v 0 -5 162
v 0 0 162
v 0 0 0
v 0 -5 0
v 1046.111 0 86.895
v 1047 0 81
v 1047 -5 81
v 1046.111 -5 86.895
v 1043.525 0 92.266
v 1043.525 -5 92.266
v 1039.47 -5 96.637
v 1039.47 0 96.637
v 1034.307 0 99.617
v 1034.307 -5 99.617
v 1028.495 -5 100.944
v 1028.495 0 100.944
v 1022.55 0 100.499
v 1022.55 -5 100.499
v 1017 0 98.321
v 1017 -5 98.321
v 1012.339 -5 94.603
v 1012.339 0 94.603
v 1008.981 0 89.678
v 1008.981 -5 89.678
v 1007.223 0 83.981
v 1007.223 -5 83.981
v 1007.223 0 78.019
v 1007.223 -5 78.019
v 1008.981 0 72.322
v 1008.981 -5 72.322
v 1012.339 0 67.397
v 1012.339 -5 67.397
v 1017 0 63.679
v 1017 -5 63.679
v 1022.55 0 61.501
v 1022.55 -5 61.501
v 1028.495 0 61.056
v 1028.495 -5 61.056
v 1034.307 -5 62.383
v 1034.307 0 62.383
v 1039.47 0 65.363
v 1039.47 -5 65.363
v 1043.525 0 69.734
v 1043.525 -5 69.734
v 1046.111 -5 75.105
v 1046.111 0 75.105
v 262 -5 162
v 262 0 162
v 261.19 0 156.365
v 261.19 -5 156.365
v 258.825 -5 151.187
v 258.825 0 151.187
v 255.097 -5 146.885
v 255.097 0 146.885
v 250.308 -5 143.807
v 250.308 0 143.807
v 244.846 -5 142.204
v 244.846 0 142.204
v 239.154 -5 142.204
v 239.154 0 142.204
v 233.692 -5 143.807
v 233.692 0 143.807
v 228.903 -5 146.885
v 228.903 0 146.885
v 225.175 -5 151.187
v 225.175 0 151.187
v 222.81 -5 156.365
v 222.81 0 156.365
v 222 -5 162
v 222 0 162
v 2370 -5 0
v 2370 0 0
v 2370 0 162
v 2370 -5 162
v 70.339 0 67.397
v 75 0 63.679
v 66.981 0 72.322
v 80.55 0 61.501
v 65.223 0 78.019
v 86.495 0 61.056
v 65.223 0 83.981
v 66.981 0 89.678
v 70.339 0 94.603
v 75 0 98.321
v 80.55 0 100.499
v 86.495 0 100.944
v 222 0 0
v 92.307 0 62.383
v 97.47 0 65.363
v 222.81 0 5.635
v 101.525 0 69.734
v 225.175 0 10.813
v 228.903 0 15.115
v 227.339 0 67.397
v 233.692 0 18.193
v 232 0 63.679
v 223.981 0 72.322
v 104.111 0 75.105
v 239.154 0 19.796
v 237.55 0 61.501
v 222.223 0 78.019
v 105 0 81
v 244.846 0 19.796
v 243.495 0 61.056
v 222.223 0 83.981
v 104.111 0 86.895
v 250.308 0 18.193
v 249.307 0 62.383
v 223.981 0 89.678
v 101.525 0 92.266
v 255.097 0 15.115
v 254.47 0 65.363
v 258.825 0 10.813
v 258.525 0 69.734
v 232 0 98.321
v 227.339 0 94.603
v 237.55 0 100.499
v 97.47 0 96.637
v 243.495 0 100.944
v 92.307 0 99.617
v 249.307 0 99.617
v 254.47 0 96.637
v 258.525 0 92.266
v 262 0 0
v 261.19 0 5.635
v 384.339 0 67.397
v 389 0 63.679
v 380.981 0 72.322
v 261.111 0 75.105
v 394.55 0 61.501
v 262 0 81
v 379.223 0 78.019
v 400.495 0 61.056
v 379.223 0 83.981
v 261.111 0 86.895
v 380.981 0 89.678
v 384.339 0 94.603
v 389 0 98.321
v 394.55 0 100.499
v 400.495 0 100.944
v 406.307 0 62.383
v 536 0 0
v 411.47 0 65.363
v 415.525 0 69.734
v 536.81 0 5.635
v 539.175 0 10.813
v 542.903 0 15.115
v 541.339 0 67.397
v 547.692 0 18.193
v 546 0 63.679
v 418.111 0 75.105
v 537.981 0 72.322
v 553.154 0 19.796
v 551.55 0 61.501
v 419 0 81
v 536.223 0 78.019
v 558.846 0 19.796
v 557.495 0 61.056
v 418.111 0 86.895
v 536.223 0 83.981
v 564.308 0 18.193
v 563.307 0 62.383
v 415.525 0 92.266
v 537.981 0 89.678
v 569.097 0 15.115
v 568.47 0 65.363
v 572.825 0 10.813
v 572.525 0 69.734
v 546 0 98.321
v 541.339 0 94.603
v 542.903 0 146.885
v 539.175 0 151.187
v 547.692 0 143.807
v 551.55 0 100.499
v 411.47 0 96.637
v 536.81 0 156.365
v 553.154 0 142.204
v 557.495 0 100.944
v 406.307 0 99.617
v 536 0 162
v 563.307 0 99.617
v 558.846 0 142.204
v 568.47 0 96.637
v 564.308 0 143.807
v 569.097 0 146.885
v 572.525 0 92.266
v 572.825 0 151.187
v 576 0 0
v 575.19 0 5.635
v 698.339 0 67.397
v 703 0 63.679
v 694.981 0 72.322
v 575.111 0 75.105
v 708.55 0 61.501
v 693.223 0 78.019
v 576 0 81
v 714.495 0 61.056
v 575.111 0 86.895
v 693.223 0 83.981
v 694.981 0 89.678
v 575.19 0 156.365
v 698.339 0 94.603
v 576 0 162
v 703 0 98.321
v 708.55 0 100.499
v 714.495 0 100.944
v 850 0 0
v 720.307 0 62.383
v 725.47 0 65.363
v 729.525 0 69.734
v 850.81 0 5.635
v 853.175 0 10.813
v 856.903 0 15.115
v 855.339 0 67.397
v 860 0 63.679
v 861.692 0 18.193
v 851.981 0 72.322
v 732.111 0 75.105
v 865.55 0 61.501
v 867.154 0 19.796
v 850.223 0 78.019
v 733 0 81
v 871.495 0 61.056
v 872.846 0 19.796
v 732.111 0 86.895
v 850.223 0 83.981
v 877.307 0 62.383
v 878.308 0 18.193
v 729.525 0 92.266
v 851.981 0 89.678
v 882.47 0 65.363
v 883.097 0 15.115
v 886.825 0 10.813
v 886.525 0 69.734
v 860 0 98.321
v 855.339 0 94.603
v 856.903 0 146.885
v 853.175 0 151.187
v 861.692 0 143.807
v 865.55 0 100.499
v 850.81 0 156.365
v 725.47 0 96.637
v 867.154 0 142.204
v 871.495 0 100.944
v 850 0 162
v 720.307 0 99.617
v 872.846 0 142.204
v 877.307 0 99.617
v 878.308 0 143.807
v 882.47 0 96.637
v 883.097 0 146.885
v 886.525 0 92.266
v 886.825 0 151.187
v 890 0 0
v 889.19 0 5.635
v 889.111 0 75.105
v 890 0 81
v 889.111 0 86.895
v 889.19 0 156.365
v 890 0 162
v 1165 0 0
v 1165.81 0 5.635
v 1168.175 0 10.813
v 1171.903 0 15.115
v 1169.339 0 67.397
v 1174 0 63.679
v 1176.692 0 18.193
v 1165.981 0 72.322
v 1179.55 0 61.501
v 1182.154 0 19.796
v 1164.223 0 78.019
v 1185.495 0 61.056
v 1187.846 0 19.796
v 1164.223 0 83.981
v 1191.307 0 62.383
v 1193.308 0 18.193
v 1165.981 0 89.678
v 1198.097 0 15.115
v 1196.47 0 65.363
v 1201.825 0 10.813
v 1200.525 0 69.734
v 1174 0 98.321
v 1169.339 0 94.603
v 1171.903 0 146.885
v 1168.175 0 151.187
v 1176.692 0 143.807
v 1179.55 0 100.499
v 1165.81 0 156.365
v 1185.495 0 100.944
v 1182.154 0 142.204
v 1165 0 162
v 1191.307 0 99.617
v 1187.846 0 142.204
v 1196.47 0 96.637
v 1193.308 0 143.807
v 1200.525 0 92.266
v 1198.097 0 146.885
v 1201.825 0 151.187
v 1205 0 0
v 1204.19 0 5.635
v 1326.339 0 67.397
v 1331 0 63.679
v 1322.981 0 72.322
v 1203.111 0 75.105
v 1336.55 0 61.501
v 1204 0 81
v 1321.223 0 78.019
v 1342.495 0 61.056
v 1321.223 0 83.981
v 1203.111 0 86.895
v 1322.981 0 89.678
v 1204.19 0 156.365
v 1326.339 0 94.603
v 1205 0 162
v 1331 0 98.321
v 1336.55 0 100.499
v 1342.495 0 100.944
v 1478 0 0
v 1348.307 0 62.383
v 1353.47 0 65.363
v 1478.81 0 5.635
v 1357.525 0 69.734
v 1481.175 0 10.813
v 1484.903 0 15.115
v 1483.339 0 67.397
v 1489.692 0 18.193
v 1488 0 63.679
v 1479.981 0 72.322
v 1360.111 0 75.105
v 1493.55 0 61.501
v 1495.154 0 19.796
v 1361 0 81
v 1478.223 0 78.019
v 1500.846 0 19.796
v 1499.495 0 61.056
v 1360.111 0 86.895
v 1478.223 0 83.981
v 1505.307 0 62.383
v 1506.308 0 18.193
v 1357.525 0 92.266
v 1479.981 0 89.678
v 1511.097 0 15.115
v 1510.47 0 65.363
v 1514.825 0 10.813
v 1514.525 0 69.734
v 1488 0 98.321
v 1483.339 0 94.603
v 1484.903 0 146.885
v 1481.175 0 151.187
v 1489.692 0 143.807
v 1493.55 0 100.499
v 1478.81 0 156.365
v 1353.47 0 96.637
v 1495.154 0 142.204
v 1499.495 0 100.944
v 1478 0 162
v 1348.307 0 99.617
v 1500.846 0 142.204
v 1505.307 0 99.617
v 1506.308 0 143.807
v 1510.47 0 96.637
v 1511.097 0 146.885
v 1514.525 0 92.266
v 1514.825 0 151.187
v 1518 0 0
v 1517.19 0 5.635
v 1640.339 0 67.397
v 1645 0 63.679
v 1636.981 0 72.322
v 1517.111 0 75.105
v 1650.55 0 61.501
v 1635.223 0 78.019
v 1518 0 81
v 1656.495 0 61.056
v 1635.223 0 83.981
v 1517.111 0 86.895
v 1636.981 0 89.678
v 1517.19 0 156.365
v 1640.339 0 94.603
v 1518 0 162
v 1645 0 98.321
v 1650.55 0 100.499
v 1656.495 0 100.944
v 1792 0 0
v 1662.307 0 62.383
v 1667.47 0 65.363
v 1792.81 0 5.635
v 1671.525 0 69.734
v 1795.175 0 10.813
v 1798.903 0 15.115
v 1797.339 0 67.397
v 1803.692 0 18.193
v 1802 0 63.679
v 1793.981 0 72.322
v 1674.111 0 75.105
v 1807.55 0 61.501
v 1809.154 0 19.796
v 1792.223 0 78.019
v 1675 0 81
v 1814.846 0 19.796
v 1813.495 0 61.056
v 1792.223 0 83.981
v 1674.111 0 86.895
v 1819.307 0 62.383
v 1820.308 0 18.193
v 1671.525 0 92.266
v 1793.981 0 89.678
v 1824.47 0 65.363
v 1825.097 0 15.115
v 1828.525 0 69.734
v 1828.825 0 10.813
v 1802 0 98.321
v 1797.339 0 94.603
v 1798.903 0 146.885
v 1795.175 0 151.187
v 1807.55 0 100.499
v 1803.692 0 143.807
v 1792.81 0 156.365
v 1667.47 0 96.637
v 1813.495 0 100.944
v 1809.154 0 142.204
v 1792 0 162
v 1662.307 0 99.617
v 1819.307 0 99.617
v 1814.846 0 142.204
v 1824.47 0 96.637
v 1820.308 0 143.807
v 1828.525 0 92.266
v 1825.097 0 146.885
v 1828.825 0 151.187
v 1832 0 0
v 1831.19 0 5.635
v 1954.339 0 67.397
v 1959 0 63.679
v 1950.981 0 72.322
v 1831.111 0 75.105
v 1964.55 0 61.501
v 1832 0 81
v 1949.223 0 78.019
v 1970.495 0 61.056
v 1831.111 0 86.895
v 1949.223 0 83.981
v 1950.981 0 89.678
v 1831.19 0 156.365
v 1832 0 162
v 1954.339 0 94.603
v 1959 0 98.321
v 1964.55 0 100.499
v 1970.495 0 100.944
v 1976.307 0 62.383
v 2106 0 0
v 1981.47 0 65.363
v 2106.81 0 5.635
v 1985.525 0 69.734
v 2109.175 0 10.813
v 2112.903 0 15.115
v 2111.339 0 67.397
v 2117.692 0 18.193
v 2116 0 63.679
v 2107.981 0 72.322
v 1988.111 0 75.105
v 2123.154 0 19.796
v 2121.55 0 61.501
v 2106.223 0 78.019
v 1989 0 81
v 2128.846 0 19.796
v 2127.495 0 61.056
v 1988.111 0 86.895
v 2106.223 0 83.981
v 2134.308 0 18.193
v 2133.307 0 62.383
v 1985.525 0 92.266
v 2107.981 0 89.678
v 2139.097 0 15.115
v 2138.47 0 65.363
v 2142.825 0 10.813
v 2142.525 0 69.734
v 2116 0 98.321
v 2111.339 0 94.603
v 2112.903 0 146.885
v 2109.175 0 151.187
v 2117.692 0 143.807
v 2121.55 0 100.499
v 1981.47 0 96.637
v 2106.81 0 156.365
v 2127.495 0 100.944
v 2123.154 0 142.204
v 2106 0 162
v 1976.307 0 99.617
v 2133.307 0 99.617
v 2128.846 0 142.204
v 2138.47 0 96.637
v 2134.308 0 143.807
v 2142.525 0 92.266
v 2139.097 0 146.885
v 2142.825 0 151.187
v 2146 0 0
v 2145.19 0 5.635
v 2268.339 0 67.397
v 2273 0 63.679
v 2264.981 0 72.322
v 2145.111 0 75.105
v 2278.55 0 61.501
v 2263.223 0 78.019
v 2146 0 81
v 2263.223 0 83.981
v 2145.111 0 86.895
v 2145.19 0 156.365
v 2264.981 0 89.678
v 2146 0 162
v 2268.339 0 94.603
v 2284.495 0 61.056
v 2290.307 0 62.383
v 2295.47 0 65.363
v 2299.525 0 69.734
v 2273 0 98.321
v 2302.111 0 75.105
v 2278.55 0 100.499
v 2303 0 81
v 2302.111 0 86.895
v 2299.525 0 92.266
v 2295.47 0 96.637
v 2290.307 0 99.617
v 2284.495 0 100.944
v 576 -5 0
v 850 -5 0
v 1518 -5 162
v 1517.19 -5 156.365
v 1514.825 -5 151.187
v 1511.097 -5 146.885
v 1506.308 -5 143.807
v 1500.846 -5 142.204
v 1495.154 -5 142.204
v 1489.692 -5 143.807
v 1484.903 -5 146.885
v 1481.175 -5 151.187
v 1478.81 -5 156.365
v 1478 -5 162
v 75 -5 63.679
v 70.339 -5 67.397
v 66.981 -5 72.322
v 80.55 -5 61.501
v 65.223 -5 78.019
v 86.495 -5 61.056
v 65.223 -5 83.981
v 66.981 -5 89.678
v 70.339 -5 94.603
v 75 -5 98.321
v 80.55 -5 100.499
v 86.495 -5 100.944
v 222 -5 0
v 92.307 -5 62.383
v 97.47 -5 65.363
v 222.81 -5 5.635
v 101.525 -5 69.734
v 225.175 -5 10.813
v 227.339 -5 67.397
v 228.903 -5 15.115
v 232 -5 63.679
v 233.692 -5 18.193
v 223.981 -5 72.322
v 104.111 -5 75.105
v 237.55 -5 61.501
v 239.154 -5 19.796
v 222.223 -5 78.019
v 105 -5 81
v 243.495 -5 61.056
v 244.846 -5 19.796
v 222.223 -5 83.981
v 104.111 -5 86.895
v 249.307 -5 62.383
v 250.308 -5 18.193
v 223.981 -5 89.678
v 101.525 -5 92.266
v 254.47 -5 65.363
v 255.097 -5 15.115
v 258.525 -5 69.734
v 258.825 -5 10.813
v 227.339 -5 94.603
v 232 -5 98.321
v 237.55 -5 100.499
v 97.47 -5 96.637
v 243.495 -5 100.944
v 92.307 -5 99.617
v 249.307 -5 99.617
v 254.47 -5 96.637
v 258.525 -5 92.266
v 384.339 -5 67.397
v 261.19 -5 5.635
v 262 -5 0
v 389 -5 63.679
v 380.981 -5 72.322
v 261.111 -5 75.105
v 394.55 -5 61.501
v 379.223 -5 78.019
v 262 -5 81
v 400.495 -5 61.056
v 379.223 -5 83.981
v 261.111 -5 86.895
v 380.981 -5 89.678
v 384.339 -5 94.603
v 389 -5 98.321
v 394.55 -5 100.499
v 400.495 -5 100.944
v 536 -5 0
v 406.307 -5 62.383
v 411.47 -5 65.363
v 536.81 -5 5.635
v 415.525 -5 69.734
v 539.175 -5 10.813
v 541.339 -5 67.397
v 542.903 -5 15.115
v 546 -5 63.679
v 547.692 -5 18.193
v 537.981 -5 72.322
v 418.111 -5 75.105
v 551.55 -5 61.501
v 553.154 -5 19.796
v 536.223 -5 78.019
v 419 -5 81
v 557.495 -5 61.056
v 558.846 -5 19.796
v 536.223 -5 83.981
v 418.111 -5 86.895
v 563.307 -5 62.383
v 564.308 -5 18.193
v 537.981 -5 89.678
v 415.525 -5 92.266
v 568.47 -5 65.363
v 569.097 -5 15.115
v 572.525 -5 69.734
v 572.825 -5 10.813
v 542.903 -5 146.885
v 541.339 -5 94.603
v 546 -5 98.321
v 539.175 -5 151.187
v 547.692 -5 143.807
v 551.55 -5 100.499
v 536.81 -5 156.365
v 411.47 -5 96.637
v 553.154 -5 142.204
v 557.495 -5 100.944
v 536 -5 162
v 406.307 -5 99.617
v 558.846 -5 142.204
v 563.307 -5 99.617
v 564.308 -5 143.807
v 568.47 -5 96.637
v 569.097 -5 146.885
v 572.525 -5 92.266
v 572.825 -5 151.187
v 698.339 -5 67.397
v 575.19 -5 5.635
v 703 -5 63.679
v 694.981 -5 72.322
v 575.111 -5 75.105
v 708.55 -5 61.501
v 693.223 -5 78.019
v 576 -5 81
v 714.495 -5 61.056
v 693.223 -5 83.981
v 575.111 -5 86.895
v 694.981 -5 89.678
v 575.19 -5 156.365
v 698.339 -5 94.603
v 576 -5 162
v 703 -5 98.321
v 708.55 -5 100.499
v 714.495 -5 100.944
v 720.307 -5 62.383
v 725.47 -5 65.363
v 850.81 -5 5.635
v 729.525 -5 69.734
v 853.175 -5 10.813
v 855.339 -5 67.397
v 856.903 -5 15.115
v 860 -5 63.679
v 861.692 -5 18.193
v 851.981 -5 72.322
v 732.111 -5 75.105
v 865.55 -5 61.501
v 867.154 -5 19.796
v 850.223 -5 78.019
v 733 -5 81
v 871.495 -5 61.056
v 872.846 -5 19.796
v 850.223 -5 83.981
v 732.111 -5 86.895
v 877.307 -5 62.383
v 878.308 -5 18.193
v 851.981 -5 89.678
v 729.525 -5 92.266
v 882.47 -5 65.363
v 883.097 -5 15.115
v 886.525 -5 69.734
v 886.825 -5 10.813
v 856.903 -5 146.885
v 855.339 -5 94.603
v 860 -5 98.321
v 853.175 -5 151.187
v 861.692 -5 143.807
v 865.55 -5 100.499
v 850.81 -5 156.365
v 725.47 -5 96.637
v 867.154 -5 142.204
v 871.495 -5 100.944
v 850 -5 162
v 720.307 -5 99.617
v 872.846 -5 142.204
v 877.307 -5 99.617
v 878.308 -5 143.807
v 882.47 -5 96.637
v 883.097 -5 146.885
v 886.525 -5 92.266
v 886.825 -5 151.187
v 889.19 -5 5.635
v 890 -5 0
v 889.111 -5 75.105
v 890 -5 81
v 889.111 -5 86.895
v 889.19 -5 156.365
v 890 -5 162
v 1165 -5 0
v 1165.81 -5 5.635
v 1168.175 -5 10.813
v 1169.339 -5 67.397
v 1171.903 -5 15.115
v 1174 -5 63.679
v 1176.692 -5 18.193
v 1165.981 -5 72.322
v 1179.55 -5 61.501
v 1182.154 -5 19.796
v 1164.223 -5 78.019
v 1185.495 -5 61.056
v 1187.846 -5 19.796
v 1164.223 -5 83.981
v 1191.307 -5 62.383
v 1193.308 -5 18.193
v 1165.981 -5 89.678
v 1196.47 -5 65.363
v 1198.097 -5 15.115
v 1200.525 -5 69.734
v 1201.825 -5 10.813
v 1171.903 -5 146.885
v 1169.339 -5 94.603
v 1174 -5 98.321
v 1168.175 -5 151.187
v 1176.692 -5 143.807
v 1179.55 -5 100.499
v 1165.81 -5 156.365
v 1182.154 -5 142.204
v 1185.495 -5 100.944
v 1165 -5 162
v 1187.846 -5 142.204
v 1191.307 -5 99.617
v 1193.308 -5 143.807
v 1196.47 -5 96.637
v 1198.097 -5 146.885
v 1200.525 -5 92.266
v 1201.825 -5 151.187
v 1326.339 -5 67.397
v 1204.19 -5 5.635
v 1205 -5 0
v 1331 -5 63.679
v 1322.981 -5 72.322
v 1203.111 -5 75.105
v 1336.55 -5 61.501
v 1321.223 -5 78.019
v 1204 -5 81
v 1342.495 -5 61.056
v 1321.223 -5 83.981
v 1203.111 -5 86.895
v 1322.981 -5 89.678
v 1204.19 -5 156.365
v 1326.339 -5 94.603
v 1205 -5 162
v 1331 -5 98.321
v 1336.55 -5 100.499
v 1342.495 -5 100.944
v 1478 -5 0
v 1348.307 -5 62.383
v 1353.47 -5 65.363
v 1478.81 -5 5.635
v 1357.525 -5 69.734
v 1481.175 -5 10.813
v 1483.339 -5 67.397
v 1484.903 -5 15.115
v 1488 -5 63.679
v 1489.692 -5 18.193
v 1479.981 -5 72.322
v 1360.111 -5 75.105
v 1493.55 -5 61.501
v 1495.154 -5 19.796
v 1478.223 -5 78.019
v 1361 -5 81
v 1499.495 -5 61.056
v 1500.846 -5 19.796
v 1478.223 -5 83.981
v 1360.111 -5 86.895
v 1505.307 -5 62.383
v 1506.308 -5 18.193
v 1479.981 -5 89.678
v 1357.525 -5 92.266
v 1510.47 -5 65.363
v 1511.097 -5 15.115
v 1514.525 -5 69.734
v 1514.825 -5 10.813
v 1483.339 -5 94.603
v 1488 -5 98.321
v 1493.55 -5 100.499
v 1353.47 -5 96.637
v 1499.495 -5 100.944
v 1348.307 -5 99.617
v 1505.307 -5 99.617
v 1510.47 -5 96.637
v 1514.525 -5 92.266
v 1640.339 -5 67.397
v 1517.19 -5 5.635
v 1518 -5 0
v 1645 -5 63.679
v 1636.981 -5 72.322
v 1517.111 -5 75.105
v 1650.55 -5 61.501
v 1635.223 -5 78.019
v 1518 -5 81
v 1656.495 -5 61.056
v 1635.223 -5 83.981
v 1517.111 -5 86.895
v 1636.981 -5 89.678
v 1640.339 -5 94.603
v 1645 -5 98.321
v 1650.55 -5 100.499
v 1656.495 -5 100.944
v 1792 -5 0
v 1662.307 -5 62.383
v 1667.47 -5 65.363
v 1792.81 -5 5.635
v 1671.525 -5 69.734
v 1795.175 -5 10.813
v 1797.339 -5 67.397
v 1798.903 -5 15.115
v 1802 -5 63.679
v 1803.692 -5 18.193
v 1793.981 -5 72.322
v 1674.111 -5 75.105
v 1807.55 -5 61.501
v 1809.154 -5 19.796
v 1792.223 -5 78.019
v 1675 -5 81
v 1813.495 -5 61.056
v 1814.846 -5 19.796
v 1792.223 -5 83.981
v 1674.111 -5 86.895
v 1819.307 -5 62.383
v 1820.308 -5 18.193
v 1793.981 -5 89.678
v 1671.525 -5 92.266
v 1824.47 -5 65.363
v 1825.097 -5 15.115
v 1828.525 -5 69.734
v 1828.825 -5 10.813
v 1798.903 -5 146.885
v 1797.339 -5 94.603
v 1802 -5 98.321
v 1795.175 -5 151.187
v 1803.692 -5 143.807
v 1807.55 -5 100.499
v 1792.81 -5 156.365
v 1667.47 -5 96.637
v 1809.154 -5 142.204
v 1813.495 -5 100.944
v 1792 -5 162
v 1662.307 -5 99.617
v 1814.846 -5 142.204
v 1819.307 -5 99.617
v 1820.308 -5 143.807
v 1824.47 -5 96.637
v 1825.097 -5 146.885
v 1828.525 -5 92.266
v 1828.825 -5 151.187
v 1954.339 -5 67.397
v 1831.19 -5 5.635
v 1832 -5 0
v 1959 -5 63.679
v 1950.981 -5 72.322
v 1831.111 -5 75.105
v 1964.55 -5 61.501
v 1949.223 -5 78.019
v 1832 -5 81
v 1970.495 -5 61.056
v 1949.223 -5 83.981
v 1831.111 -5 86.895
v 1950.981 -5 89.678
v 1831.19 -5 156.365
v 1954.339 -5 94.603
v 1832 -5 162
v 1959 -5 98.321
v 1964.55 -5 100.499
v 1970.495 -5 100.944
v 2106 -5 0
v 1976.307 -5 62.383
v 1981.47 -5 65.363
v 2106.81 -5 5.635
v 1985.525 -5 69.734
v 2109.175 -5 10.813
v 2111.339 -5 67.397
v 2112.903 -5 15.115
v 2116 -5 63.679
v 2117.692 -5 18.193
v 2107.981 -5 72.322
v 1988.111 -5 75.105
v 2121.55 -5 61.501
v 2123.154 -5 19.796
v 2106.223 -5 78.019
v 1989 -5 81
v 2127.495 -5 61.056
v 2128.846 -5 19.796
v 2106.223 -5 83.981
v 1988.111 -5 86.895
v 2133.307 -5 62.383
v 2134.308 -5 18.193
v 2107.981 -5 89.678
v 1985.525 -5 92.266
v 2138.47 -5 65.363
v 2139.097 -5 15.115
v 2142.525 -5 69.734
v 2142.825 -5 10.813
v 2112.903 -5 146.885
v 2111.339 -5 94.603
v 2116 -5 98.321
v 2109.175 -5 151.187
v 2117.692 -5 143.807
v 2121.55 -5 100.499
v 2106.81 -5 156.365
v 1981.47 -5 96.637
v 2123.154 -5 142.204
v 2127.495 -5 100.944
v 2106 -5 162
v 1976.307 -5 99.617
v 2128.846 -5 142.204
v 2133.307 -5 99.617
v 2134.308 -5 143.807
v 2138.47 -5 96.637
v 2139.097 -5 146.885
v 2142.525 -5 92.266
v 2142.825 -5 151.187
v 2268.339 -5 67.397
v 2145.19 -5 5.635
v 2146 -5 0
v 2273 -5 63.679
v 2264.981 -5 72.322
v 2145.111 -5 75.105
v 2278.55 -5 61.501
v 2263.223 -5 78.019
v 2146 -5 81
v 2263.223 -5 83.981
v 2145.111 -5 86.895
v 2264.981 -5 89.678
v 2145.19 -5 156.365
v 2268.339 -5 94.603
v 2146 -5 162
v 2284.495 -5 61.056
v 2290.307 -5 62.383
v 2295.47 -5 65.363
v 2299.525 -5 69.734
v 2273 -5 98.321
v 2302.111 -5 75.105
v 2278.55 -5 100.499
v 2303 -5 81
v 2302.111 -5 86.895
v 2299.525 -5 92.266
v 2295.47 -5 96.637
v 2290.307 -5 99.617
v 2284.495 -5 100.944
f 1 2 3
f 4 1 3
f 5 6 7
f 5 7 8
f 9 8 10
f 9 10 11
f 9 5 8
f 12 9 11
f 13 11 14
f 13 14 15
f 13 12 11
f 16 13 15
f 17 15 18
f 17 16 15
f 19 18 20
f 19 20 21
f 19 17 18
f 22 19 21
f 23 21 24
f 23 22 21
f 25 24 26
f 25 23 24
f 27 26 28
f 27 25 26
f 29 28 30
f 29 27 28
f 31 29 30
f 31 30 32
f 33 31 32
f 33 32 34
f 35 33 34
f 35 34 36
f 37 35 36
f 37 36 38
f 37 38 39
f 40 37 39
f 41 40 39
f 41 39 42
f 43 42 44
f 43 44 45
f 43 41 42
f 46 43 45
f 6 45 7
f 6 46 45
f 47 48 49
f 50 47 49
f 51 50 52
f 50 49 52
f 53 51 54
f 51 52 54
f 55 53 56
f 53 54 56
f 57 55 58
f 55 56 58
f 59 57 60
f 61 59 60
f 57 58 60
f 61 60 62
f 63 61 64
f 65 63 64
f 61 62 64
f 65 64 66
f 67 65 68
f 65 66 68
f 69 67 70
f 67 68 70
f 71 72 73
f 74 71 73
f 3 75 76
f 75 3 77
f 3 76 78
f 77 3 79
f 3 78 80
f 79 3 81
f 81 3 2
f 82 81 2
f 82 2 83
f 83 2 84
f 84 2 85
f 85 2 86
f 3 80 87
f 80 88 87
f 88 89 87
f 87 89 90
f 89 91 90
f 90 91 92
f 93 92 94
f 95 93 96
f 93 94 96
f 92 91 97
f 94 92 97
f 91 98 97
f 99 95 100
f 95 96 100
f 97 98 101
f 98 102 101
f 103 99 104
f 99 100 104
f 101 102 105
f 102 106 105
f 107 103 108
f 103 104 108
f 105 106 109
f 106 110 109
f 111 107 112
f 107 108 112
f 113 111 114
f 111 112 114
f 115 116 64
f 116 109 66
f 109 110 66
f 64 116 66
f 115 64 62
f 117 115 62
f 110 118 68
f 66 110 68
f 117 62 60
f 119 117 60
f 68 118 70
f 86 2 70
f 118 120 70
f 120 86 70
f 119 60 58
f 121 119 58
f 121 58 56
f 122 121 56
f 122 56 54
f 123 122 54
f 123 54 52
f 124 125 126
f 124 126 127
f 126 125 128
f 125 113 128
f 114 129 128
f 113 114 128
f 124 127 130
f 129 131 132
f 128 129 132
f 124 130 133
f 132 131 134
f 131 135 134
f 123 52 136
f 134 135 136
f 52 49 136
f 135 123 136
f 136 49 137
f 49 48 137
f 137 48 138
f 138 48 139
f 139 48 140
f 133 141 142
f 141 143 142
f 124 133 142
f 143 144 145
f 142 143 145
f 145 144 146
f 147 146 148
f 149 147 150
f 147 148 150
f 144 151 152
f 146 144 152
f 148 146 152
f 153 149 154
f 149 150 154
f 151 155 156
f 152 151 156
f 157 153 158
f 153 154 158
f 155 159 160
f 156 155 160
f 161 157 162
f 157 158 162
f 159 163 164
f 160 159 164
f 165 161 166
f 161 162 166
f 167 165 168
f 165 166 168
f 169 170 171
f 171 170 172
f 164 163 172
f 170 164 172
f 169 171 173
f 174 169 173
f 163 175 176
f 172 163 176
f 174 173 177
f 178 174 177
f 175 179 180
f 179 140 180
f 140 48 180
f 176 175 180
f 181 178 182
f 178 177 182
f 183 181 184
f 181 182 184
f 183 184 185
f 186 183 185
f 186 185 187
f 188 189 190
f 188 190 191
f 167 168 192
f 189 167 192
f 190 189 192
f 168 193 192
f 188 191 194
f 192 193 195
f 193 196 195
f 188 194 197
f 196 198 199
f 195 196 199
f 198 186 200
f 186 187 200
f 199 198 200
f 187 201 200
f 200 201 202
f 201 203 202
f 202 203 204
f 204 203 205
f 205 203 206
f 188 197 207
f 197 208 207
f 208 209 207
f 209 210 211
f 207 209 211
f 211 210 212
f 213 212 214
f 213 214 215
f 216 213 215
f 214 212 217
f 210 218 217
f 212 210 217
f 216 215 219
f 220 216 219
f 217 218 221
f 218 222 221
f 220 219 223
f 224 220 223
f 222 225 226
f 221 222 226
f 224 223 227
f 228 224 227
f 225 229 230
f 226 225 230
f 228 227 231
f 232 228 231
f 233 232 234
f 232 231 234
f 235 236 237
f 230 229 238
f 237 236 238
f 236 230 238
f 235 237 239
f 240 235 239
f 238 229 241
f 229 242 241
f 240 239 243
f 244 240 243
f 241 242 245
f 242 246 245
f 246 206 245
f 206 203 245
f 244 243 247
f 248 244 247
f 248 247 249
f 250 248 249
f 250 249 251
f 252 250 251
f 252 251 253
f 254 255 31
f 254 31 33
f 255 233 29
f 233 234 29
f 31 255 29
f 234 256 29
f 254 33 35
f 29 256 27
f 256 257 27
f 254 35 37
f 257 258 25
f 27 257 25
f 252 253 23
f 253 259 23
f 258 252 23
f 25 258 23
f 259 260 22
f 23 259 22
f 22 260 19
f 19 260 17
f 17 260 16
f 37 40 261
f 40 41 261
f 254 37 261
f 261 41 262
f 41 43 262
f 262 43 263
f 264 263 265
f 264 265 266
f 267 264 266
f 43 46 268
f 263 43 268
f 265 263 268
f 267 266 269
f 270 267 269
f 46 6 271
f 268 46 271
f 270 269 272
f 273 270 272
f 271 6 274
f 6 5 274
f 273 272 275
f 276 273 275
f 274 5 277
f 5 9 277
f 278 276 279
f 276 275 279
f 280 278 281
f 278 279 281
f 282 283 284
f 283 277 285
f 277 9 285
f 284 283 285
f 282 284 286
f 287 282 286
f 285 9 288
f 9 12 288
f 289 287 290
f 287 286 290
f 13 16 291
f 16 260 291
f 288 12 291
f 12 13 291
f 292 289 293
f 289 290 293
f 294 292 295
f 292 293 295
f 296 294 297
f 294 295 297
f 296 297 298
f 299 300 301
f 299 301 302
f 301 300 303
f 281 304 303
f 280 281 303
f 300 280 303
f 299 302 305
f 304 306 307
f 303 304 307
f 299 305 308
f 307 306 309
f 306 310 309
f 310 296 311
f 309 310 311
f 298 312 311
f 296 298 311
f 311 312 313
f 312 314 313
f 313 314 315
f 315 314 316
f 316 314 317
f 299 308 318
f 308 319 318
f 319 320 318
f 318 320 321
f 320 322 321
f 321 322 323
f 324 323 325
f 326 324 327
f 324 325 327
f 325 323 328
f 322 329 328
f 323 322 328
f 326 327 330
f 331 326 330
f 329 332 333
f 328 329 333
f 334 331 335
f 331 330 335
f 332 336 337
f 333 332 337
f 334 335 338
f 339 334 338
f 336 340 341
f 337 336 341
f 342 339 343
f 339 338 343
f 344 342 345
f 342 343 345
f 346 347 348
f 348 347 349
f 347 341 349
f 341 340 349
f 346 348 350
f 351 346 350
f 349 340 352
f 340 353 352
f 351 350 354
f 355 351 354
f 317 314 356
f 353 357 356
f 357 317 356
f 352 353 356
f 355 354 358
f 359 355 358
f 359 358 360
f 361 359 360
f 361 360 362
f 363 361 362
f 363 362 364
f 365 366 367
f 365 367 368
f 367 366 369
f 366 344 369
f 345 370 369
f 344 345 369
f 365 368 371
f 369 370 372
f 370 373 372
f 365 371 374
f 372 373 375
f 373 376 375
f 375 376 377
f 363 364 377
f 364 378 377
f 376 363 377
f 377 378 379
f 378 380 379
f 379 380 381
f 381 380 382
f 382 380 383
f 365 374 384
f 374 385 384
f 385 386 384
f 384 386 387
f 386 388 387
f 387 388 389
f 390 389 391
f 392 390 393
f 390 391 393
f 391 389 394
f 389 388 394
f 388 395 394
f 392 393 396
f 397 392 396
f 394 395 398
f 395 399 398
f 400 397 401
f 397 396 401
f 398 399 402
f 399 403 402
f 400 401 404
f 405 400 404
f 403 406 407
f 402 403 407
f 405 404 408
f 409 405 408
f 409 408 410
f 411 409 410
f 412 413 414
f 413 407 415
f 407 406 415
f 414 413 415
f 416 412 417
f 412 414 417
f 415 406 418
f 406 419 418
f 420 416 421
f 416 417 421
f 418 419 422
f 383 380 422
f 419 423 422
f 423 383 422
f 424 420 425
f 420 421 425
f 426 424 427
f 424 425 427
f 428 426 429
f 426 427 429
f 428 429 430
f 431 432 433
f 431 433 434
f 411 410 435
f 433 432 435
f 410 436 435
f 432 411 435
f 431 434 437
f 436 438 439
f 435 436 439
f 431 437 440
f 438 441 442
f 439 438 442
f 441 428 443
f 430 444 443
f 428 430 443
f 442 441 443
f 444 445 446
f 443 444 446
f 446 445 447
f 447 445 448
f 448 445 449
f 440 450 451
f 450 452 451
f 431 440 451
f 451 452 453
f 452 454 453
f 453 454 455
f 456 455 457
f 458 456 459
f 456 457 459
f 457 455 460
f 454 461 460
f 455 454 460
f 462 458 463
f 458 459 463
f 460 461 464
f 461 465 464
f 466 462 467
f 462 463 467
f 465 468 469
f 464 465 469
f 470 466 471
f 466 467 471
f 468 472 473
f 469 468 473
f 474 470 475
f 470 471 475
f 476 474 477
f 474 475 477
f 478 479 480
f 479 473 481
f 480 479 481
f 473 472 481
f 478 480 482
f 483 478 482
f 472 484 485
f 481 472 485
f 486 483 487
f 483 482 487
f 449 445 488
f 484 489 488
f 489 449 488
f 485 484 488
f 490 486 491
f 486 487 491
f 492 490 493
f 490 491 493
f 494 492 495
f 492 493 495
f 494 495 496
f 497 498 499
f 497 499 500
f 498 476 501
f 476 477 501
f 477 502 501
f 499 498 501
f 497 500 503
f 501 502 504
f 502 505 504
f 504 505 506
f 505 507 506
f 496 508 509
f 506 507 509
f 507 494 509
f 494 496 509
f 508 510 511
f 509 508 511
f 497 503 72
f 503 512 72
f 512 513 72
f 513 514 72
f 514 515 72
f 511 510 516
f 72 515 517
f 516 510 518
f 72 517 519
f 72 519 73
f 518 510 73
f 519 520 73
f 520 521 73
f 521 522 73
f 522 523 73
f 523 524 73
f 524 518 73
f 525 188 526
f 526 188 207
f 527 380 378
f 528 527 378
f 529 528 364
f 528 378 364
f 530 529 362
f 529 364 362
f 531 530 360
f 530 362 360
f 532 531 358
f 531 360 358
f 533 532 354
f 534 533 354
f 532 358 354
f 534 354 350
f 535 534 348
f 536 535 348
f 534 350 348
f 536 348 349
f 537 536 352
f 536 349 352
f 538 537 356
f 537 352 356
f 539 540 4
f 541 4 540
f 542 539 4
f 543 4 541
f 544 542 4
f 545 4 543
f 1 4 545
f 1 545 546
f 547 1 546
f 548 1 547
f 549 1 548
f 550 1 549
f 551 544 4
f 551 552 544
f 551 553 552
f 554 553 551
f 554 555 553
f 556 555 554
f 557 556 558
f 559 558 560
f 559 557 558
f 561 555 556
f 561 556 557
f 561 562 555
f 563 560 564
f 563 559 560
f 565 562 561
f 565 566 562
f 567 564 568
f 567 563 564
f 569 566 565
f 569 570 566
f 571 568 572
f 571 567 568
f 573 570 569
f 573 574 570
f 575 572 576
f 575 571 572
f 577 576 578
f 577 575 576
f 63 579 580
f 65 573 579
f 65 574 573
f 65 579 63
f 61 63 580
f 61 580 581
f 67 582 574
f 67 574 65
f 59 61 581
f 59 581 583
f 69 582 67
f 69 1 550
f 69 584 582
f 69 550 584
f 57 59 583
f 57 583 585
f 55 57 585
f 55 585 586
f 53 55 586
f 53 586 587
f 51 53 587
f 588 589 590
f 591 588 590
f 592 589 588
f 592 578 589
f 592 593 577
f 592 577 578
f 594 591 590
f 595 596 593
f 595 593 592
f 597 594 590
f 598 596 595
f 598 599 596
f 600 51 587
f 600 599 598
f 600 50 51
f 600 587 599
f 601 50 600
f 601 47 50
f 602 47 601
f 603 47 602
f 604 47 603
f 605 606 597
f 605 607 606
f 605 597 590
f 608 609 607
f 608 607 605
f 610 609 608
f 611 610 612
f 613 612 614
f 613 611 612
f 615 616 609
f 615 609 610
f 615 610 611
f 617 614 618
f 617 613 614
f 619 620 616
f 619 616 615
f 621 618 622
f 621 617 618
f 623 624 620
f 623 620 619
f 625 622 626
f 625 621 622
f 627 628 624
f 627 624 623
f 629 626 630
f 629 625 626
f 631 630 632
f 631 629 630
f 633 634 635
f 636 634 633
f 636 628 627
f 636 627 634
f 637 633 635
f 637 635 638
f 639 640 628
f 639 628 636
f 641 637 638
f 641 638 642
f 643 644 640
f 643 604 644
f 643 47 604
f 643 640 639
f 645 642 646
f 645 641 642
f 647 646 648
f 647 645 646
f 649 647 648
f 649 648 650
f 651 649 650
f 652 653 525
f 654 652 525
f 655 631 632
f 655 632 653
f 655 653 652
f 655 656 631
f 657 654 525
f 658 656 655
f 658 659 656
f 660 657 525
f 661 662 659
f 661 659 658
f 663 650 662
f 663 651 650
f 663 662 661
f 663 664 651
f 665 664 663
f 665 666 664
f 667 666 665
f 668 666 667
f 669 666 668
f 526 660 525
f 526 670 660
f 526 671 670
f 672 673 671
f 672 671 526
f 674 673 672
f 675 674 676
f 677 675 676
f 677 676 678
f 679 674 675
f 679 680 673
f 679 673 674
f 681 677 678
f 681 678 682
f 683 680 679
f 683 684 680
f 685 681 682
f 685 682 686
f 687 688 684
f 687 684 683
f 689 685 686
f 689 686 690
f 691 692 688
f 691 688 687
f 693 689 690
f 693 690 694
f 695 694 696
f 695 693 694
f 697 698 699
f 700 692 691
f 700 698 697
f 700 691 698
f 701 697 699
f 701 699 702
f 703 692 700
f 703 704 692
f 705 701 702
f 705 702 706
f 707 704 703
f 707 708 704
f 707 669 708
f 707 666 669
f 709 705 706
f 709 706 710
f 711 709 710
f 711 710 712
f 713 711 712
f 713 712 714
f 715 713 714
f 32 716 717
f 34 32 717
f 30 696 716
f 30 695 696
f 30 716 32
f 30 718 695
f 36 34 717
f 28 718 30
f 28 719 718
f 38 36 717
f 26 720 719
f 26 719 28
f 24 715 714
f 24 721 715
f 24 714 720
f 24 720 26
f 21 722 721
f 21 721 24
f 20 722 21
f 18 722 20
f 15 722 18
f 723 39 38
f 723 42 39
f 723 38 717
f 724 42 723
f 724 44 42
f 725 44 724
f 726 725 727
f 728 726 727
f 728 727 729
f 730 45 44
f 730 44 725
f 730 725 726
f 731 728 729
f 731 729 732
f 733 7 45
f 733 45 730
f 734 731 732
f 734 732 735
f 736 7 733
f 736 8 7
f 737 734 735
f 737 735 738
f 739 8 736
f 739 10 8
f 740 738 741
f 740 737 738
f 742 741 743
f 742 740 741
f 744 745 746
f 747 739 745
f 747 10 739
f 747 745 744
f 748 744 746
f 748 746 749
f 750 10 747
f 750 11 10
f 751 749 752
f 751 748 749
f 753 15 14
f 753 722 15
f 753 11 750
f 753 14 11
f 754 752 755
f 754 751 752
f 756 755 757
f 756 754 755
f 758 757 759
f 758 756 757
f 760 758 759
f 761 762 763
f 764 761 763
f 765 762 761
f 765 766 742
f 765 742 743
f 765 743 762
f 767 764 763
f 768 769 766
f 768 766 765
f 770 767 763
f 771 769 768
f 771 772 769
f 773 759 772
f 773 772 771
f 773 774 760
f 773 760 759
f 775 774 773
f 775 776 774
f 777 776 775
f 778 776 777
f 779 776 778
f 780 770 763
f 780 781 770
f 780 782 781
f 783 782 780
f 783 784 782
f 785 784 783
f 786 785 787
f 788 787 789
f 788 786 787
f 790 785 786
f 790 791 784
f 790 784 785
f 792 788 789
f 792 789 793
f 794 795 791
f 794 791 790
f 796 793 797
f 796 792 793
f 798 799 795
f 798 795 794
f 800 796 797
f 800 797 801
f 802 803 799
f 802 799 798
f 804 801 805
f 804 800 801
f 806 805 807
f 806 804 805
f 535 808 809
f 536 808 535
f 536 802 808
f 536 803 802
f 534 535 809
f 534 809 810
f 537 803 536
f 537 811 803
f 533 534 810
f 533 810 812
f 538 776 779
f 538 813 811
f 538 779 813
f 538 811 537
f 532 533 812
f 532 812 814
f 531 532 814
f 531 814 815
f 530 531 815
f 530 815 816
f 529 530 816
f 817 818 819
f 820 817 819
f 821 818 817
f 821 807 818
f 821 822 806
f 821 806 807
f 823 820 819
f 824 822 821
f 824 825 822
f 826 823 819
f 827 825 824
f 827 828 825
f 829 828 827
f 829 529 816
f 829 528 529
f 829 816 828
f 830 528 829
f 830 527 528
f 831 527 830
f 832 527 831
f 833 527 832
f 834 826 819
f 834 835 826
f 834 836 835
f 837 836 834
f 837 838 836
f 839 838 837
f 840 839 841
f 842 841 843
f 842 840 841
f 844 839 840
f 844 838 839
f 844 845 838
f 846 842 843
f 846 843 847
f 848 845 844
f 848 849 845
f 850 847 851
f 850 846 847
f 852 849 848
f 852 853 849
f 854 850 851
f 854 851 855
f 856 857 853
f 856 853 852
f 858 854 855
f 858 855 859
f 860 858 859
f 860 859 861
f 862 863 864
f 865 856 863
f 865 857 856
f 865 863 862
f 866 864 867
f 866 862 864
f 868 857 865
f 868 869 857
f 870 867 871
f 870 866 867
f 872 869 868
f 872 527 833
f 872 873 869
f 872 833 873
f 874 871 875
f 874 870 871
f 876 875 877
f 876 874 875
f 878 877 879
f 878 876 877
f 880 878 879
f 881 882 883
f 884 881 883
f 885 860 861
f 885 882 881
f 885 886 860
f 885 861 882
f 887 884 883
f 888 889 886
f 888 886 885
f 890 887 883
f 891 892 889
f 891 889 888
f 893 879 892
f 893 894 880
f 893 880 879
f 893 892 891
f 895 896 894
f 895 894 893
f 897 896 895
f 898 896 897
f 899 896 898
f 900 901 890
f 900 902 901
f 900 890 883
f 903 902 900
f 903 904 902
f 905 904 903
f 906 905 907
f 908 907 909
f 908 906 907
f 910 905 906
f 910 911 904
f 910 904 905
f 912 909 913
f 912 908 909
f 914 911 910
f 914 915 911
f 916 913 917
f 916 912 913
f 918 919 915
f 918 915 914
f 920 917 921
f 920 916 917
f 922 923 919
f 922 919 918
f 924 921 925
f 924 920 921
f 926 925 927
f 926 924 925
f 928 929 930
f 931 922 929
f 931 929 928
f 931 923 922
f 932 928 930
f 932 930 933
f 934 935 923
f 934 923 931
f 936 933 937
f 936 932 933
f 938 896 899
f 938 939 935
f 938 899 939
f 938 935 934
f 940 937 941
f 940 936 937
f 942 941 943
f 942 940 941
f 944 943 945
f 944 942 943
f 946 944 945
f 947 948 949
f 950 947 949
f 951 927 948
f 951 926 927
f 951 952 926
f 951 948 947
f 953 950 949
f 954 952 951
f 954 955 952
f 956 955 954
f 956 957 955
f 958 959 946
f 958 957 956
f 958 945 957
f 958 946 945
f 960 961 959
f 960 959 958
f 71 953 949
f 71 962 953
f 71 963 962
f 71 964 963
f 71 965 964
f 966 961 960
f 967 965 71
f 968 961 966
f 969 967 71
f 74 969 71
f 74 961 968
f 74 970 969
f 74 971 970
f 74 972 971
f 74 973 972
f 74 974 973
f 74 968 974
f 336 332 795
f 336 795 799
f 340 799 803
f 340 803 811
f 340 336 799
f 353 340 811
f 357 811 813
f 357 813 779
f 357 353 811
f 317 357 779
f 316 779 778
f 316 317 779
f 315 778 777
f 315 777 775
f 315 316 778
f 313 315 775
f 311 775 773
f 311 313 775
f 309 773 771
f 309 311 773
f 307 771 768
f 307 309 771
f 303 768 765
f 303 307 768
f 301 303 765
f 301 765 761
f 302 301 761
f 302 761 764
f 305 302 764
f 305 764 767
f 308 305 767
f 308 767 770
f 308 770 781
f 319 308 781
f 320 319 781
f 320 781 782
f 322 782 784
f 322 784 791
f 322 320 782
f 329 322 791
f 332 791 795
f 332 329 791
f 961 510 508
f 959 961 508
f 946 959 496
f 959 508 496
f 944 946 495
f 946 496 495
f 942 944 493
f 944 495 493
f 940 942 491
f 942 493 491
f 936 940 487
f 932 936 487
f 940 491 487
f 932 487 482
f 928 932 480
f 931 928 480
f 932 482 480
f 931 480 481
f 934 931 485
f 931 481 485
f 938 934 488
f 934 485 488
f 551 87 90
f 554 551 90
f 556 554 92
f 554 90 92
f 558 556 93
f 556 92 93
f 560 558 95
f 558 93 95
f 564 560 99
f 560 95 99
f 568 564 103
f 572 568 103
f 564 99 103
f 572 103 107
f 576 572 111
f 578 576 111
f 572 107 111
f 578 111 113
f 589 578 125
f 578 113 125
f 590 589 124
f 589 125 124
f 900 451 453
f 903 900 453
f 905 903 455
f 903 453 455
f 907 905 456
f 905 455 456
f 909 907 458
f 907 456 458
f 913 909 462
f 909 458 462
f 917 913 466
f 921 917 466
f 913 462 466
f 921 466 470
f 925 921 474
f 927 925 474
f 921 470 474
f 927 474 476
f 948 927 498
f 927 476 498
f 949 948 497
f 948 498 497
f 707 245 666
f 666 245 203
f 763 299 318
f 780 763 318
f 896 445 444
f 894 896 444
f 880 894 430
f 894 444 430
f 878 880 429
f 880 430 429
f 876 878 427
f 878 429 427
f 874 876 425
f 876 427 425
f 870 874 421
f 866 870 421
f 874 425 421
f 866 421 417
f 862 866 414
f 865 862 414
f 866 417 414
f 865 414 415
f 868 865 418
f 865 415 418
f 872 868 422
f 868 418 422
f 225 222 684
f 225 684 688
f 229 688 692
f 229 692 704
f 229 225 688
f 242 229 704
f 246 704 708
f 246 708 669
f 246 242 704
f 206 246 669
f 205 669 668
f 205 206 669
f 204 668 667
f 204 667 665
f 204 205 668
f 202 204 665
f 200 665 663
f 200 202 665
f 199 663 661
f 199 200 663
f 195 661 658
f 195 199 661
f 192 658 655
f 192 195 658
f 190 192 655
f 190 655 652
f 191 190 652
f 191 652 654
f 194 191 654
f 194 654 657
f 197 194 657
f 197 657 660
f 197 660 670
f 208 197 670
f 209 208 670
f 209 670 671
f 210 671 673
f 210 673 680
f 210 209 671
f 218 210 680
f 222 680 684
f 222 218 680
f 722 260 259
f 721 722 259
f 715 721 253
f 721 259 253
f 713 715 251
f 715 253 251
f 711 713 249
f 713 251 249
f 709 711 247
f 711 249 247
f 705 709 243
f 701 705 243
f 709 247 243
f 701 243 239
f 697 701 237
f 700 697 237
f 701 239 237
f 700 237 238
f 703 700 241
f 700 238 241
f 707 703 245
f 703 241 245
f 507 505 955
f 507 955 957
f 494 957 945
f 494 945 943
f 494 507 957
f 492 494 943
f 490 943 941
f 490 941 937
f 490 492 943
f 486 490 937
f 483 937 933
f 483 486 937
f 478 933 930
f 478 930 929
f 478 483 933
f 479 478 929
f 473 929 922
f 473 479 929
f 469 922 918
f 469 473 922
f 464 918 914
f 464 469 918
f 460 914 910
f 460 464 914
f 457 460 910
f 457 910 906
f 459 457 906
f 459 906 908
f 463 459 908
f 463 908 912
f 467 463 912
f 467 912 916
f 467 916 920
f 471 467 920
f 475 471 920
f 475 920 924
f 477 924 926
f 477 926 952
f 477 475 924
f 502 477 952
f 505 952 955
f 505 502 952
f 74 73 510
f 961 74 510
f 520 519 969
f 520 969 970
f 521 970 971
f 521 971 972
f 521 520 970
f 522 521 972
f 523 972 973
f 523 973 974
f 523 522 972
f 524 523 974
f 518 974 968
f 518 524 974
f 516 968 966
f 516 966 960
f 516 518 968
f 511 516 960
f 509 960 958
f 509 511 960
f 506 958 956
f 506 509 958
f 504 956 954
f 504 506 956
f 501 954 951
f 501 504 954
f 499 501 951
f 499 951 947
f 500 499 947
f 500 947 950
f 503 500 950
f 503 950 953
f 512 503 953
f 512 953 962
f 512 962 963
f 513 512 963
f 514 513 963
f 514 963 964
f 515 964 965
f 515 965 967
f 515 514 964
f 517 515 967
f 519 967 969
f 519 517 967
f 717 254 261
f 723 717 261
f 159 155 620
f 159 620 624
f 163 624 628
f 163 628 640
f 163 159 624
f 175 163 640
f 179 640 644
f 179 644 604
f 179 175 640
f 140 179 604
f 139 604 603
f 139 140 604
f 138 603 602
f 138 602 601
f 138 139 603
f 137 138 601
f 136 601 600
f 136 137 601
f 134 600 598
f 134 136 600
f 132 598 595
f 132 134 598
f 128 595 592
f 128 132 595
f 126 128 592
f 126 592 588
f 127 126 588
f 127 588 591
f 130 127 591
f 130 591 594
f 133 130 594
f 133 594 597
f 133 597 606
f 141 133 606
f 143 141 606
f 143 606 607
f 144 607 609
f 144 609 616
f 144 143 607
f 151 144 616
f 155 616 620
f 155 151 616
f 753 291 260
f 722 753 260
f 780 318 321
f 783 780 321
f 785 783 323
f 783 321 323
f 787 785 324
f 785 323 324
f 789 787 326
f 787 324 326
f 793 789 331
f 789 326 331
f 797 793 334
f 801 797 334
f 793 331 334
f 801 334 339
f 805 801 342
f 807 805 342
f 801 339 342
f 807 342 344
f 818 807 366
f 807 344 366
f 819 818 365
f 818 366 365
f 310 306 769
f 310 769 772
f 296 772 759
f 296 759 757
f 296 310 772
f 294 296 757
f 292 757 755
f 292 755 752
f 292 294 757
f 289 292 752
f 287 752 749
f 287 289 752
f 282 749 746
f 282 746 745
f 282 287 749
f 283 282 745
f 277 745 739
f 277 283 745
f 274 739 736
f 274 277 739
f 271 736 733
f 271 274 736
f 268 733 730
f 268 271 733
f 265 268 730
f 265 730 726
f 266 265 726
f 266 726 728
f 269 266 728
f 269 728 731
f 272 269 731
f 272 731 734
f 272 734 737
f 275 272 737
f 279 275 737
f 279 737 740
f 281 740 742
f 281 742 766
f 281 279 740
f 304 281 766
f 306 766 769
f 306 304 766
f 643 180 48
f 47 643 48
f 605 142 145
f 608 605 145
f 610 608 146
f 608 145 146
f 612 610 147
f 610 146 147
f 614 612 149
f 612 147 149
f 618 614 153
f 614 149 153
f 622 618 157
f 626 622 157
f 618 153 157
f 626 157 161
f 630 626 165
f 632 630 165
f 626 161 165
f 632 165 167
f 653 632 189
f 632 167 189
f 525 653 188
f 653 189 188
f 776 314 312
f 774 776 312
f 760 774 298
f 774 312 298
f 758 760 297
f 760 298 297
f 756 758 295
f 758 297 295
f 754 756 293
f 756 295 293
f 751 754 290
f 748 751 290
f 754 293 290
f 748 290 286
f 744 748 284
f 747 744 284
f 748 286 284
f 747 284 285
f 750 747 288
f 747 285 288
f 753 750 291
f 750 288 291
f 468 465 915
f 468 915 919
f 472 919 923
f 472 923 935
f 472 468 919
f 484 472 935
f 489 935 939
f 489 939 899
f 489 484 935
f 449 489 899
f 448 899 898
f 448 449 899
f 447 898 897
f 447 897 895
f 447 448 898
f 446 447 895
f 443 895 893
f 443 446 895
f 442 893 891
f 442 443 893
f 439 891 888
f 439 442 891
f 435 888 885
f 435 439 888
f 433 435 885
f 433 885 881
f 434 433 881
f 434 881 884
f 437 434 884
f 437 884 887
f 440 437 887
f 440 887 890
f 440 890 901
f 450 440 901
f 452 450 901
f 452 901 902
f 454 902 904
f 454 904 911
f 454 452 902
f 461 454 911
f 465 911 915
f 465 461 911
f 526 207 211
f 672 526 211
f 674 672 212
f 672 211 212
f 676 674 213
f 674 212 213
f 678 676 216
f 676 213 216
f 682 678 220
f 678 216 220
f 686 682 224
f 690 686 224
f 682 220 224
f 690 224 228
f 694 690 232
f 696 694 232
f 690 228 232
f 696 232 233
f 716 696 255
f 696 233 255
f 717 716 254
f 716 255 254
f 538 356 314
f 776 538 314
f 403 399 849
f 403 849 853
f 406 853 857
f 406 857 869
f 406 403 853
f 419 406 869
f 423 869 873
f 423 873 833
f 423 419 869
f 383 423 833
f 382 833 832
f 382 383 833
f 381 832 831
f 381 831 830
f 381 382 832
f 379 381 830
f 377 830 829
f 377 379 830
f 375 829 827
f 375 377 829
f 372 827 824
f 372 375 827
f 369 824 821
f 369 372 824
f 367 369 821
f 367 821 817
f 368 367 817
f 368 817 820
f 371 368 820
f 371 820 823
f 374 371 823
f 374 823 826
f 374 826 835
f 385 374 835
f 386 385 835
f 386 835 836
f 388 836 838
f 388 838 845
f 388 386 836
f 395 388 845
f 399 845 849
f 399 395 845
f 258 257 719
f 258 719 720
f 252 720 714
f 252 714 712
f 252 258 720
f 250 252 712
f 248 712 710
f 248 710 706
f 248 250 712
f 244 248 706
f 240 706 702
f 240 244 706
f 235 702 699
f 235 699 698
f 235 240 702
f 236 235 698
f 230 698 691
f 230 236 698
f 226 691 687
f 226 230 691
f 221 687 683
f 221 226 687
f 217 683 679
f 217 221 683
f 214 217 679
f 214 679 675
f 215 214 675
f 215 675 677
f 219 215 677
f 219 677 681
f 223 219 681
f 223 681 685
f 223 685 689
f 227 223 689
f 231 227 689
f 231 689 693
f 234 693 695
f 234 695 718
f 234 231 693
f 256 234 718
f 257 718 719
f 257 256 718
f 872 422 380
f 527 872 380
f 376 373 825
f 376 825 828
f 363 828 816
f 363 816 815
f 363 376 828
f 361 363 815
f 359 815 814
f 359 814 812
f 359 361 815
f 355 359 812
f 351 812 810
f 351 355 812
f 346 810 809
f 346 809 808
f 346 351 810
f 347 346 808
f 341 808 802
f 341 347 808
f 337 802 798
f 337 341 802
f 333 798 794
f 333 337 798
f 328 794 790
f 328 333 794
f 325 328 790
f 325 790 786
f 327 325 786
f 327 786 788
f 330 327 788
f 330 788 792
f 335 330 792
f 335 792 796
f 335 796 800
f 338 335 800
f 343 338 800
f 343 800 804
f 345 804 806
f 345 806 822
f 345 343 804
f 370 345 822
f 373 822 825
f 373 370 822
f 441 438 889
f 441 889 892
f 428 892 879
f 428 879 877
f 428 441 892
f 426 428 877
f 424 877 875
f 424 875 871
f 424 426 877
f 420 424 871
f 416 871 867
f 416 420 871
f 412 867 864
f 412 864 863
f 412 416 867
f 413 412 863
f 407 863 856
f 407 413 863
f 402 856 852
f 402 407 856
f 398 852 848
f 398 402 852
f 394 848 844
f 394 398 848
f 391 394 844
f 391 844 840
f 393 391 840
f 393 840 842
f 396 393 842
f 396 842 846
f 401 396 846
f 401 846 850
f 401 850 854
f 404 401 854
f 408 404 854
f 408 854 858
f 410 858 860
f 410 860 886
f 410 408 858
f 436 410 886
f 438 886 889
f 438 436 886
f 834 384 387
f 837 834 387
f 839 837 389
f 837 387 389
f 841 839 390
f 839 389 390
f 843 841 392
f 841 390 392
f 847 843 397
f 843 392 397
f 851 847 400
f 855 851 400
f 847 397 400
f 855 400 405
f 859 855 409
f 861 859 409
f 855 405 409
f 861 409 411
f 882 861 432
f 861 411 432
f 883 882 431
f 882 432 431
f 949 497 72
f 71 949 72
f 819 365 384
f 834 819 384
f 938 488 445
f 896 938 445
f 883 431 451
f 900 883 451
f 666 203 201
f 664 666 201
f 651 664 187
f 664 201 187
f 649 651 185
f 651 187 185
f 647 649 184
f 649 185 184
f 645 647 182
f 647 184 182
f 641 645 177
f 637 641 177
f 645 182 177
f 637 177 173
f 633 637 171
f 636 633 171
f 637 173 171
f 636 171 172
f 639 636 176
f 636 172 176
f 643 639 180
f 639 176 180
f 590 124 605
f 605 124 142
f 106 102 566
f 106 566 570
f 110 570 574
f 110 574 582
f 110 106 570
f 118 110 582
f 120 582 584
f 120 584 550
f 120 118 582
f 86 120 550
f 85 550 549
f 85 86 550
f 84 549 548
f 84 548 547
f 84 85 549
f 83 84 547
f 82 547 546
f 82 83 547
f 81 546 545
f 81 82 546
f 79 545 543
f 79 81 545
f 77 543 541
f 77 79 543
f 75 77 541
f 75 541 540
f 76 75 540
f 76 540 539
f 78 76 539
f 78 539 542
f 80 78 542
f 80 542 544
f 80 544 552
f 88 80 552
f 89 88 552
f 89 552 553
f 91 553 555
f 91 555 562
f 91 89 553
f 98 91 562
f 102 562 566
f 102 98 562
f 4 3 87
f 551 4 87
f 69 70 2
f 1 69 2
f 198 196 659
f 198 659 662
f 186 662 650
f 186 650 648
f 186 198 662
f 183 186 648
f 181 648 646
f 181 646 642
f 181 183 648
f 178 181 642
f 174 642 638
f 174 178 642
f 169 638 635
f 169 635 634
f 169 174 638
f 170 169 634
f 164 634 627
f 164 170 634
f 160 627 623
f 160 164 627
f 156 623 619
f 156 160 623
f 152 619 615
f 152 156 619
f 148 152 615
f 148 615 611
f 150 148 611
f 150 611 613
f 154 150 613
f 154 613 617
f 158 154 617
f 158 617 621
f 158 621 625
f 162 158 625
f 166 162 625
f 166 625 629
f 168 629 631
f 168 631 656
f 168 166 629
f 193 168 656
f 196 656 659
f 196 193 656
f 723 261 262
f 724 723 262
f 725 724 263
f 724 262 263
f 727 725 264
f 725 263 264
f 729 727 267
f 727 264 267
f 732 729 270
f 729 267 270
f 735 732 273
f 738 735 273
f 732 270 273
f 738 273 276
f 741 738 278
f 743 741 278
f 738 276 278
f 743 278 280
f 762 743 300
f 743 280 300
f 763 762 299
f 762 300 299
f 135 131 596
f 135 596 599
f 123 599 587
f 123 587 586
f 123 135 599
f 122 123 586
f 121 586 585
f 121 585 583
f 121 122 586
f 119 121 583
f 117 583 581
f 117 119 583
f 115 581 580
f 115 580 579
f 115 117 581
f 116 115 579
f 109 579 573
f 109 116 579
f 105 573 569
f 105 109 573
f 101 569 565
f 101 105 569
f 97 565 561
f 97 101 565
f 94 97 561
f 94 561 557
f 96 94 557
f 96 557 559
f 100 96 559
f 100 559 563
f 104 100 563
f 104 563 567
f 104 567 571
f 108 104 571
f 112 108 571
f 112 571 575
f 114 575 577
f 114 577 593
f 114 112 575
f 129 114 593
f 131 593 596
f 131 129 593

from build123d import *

# Parameters (mm, degrees)
F0_R     = 20
F1_DEPTH = 5


with BuildPart() as f1:
    # F0 (on Front) → F1 (new body)
    with BuildSketch(Plane.XZ):
        with BuildLine():
            ThreePointArc((2106, 0), (2126, 20), (2146, 0))
            Line((2146, 0), (2370, 0))
            Line((2370, 0), (2370, 162))
            Line((2370, 162), (2146, 162))
            ThreePointArc((2146, 162), (2126, 142), (2106, 162))
            Line((2106, 162), (1832, 162))
            ThreePointArc((1832, 162), (1812, 142), (1792, 162))
            Line((1792, 162), (1518, 162))
            ThreePointArc((1518, 162), (1498, 142), (1478, 162))
            Line((1478, 162), (1205, 162))
            ThreePointArc((1205, 162), (1185, 142), (1165, 162))
            Line((1165, 162), (890, 162))
            ThreePointArc((890, 162), (870, 142), (850, 162))
            Line((850, 162), (576, 162))
            ThreePointArc((576, 162), (556, 142), (536, 162))
            Line((536, 162), (262, 162))
            ThreePointArc((262, 162), (242, 142), (222, 162))
            Line((222, 162), (0, 162))
            Line((0, 162), (0, 0))
            Line((0, 0), (222, 0))
            ThreePointArc((222, 0), (242, 20), (262, 0))
            Line((262, 0), (536, 0))
            ThreePointArc((536, 0), (556, 20), (576, 0))
            Line((576, 0), (850, 0))
            ThreePointArc((850, 0), (870, 20), (890, 0))
            Line((890, 0), (1165, 0))
            ThreePointArc((1165, 0), (1185, 20), (1205, 0))
            Line((1205, 0), (1478, 0))
            ThreePointArc((1478, 0), (1498, 20), (1518, 0))
            Line((1518, 0), (1792, 0))
            ThreePointArc((1792, 0), (1812, 20), (1832, 0))
            Line((1832, 0), (2106, 0))
        make_face()
        with Locations((85, 81)):
            Circle(F0_R, mode=Mode.SUBTRACT)
        with Locations((242, 81)):
            Circle(F0_R, mode=Mode.SUBTRACT)
        with Locations((399, 81)):
            Circle(F0_R, mode=Mode.SUBTRACT)
        with Locations((556, 81)):
            Circle(F0_R, mode=Mode.SUBTRACT)
        with Locations((713, 81)):
            Circle(F0_R, mode=Mode.SUBTRACT)
        with Locations((870, 81)):
            Circle(F0_R, mode=Mode.SUBTRACT)
        with Locations((1027, 81)):
            Circle(F0_R, mode=Mode.SUBTRACT)
        with Locations((1184, 81)):
            Circle(F0_R, mode=Mode.SUBTRACT)
        with Locations((1341, 81)):
            Circle(F0_R, mode=Mode.SUBTRACT)
        with Locations((1498, 81)):
            Circle(F0_R, mode=Mode.SUBTRACT)
        with Locations((1655, 81)):
            Circle(F0_R, mode=Mode.SUBTRACT)
        with Locations((1812, 81)):
            Circle(F0_R, mode=Mode.SUBTRACT)
        with Locations((1969, 81)):
            Circle(F0_R, mode=Mode.SUBTRACT)
        with Locations((2126, 81)):
            Circle(F0_R, mode=Mode.SUBTRACT)
        with Locations((2283, 81)):
            Circle(F0_R, mode=Mode.SUBTRACT)
    extrude(amount=F1_DEPTH)


solid = f1.part
